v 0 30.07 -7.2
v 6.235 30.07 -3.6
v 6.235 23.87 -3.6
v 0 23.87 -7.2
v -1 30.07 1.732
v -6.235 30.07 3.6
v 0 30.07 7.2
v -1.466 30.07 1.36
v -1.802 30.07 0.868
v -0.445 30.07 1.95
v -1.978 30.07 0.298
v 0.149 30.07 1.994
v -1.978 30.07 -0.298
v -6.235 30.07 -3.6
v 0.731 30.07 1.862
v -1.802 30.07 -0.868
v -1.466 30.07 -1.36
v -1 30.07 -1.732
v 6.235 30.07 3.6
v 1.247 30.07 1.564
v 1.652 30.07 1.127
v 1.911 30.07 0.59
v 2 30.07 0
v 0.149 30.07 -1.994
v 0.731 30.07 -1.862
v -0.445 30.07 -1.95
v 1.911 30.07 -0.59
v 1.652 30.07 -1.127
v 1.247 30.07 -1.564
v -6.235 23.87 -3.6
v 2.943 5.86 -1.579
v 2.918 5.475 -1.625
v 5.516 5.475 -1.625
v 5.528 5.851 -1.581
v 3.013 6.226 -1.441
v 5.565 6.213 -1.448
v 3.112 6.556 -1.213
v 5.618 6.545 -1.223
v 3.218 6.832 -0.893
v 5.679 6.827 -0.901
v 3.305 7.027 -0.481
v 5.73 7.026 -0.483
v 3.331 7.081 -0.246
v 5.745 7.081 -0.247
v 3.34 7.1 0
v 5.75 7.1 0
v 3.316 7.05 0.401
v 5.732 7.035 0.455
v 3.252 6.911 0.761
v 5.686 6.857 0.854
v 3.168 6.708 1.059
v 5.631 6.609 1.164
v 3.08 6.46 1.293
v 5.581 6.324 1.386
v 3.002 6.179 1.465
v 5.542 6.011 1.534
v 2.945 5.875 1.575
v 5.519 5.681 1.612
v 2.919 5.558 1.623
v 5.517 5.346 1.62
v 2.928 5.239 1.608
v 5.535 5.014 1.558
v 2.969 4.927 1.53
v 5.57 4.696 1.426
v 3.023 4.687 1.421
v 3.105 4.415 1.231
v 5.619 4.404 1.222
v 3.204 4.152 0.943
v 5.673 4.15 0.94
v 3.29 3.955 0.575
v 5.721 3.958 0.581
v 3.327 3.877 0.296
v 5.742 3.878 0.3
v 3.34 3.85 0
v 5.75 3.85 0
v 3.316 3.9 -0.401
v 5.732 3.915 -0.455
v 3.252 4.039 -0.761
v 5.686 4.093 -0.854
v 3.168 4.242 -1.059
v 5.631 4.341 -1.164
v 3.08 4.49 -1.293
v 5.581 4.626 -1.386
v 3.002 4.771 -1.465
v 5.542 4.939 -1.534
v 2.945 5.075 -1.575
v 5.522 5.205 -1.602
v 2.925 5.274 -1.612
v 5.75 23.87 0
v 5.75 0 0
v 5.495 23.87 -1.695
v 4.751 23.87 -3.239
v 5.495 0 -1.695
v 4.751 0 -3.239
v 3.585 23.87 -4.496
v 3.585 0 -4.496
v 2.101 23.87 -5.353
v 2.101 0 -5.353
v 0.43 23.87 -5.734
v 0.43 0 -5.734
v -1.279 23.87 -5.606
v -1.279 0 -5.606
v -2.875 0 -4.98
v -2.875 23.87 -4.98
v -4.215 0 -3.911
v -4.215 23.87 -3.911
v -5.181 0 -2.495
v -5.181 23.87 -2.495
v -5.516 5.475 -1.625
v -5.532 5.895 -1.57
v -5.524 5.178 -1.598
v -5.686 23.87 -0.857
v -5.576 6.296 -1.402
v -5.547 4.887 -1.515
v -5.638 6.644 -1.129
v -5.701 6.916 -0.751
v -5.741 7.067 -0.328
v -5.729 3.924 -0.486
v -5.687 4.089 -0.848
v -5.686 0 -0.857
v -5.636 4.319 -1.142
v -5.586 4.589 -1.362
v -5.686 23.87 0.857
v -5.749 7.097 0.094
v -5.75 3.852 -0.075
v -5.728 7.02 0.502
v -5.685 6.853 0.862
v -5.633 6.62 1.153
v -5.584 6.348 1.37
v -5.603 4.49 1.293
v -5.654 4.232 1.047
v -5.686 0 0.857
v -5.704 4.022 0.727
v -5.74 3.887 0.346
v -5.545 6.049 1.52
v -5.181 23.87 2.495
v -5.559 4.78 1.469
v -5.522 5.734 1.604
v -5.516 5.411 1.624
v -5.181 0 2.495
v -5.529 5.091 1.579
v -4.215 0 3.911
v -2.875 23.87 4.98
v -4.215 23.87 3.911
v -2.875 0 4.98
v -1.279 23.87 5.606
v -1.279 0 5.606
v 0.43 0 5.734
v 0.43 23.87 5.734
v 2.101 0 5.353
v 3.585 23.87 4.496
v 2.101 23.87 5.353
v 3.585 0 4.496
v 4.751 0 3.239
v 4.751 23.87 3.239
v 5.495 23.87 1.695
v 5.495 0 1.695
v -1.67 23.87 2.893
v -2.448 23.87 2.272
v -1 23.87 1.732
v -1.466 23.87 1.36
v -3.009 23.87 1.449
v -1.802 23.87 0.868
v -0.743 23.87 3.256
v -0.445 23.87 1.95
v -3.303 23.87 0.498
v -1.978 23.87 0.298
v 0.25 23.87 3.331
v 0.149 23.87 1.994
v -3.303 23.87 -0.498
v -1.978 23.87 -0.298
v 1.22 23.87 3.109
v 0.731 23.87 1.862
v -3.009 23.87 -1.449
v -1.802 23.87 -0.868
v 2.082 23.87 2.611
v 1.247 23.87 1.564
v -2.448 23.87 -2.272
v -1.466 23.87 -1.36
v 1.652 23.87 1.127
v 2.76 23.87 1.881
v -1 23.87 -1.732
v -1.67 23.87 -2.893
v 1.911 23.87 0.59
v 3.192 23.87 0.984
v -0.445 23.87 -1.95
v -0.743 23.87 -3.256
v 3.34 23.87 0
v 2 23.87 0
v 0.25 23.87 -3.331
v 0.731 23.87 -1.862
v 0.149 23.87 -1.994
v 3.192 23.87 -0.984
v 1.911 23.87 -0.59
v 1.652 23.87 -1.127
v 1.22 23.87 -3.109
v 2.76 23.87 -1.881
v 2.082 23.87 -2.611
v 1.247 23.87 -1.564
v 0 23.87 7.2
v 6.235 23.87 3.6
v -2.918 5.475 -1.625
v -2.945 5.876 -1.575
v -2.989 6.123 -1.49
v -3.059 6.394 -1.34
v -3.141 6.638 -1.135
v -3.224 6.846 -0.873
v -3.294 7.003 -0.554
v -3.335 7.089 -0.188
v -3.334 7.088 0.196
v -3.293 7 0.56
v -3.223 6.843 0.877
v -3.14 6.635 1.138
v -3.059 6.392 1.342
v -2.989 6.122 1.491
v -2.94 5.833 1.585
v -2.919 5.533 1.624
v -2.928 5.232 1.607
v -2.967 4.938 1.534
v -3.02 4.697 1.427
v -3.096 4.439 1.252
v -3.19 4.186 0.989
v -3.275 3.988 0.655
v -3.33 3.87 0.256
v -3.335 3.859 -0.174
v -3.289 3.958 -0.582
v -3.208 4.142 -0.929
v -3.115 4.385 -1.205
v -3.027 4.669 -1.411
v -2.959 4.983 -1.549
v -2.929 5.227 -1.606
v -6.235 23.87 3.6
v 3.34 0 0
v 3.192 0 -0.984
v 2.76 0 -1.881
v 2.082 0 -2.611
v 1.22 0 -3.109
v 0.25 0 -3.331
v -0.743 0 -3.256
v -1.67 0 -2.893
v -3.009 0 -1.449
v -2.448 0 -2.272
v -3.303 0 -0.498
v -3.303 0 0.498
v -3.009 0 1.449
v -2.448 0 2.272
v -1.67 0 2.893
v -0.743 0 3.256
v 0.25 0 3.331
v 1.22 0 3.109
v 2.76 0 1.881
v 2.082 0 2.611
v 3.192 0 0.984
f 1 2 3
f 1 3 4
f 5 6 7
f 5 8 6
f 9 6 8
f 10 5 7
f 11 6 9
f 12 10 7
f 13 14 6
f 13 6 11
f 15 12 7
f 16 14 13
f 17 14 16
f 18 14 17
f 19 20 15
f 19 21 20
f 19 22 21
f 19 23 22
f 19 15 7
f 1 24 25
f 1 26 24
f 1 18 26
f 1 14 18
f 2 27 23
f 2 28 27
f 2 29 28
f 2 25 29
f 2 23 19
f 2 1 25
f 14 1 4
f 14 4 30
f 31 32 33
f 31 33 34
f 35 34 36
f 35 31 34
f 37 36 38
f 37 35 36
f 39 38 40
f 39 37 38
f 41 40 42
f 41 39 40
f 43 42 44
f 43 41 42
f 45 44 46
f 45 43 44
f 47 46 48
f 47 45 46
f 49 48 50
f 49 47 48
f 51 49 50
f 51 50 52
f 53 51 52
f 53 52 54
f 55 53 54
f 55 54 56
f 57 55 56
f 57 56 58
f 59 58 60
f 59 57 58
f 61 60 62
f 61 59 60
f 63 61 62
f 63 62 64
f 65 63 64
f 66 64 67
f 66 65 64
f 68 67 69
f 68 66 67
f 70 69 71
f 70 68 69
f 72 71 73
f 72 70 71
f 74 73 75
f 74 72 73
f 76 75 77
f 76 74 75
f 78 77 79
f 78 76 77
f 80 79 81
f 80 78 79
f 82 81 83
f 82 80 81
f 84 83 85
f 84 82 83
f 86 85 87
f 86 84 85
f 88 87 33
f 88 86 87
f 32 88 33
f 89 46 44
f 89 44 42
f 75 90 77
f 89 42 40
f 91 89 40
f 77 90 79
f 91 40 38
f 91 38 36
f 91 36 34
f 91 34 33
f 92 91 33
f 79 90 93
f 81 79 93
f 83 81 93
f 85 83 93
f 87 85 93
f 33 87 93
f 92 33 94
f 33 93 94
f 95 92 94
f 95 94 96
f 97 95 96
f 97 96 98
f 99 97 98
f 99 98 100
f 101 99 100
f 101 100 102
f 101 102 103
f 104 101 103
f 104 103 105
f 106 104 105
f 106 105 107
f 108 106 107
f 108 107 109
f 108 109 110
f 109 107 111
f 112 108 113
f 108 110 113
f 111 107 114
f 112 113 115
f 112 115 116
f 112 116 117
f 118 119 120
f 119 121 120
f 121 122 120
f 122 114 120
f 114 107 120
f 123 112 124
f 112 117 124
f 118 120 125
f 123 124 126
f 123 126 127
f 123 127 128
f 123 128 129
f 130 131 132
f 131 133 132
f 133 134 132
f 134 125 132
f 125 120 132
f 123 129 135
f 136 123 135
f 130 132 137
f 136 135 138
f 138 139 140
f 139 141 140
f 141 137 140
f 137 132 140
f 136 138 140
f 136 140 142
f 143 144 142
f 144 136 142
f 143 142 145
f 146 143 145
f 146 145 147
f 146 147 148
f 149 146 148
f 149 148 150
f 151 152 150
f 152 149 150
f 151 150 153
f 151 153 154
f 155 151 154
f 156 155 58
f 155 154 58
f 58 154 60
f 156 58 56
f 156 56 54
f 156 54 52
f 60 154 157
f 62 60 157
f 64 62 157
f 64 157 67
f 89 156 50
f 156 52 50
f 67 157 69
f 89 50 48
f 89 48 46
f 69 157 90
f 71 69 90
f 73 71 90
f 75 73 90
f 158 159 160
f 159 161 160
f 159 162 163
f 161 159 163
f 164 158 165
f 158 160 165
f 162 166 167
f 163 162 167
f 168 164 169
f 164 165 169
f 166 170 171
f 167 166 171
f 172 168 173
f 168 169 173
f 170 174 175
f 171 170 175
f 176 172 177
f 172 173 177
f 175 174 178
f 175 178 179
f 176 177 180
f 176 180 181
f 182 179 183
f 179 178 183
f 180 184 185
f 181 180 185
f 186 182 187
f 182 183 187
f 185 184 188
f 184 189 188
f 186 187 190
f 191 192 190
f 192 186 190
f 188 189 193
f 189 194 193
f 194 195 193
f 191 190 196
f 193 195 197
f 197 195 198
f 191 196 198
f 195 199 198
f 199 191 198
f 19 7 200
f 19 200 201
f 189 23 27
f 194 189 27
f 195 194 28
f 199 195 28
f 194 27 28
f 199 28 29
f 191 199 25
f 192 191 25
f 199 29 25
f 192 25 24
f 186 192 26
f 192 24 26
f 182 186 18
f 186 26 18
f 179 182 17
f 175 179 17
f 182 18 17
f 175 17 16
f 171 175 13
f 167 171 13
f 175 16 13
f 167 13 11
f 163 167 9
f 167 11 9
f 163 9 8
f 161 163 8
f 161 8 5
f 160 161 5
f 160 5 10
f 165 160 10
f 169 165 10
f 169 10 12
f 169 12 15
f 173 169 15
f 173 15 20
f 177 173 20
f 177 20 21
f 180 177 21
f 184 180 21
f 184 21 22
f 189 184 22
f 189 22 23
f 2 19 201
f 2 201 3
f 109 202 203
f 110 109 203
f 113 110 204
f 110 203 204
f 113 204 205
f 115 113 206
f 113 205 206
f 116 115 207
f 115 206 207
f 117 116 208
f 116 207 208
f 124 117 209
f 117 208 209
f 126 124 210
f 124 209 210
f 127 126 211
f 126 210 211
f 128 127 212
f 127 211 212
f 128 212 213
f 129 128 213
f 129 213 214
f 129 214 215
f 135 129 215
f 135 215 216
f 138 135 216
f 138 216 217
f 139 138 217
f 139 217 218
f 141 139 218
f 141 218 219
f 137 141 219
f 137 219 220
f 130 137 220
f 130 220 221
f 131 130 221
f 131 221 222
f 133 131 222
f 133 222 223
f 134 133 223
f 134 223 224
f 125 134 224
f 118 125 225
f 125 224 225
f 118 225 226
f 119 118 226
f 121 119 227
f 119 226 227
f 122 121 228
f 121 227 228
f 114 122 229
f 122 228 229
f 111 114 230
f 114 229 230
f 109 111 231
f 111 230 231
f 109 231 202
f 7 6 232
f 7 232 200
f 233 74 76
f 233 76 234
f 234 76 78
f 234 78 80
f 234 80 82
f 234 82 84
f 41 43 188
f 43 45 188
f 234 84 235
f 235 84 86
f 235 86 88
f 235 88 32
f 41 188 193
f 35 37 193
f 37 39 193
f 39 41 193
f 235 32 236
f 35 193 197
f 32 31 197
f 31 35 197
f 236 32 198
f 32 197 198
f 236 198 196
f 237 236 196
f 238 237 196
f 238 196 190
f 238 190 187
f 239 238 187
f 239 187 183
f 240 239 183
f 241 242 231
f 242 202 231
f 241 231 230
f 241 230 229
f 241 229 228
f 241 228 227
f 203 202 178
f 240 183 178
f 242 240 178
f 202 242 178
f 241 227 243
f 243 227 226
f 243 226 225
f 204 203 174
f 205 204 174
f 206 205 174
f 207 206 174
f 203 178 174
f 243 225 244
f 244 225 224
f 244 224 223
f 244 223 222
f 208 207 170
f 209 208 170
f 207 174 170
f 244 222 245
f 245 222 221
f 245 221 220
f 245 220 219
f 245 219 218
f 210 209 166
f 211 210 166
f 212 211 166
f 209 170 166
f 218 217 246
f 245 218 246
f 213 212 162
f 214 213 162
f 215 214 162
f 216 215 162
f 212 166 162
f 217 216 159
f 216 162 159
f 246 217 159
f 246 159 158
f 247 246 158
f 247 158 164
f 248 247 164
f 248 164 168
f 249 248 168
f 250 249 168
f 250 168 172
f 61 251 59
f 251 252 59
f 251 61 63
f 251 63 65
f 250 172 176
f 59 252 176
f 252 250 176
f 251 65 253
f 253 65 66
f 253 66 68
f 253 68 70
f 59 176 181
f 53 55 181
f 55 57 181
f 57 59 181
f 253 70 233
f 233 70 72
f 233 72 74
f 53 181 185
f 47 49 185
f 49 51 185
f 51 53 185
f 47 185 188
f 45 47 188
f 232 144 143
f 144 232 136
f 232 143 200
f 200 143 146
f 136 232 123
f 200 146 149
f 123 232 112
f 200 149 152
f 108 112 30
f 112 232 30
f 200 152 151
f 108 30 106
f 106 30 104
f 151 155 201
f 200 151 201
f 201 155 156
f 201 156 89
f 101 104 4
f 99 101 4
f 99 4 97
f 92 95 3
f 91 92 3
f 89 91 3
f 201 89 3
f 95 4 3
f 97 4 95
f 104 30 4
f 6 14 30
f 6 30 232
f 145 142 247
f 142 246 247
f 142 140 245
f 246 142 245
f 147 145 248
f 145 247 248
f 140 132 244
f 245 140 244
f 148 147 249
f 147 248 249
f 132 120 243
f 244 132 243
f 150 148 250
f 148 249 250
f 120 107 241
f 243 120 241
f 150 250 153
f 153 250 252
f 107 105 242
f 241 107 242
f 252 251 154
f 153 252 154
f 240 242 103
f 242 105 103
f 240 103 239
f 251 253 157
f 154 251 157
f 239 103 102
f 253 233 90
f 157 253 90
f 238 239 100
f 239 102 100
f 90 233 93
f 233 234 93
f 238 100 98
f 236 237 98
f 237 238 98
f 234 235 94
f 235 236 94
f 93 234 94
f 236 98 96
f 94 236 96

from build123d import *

# Parameters (mm, degrees)
SKETCH1_R               = 5.75
CYLINDERBASE_DEPTH      = 30.07
SKETCH2_R               = 3.34
THROUGHHOLE_DEPTH       = 31.07
BOSS_EXTRUDE2_DEPTH     = 6.2
SKETCH4_R               = 2
CUT_EXTRUDE2_DEPTH      = 31.07
SKETCH5_R               = 1.625
CUT_EXTRUDE3_DEPTH      = 7.235382907
CUT_EXTRUDE3_DEPTH_BACK = 7.235382907


with BuildPart() as part:
    # Sketch1 → cylinderBase (new body)
    with BuildSketch(Plane(origin=(0, 0, 0), x_dir=(1, 0, 0), z_dir=(0, 1, 0))):
        Circle(SKETCH1_R)
    extrude(amount=CYLINDERBASE_DEPTH)

    # Sketch2 → throughHole (cut, through all)
    with BuildSketch(Plane(origin=(0, 30.07, 0), x_dir=(1, 0, 0), z_dir=(0, 1, 0))):
        Circle(SKETCH2_R)
    extrude(amount=-THROUGHHOLE_DEPTH, mode=Mode.SUBTRACT)

    # Sketch3 → Boss-Extrude2 (add)
    with BuildSketch(Plane(origin=(0, 30.07, 0), x_dir=(1, 0, 0), z_dir=(0, 1, 0))):
        Polygon((0, -7.2), (6.235382907, -3.6), (6.235382907, 3.6), (0, 7.2), (-6.235382907, 3.6), (-6.235382907, -3.6), align=None)
    extrude(amount=-BOSS_EXTRUDE2_DEPTH)

    # Sketch4 → Cut-Extrude2 (cut, through all)
    with BuildSketch(Plane(origin=(0, 30.07, 0), x_dir=(1, 0, 0), z_dir=(0, 1, 0))):
        Circle(SKETCH4_R)
    extrude(amount=-CUT_EXTRUDE2_DEPTH, mode=Mode.SUBTRACT)

    # Sketch5 → Cut-Extrude3 (cut, two sides)
    with BuildSketch(Plane(origin=(0, 0, 0), x_dir=(0, 0, -1), z_dir=(1, 0, 0))) as cut_extrude3_sk:
        with Locations((0, 5.475)):
            Circle(SKETCH5_R)
    extrude(amount=CUT_EXTRUDE3_DEPTH, mode=Mode.SUBTRACT)
    extrude(cut_extrude3_sk.sketch, amount=-CUT_EXTRUDE3_DEPTH_BACK, mode=Mode.SUBTRACT)


solid = part.part
